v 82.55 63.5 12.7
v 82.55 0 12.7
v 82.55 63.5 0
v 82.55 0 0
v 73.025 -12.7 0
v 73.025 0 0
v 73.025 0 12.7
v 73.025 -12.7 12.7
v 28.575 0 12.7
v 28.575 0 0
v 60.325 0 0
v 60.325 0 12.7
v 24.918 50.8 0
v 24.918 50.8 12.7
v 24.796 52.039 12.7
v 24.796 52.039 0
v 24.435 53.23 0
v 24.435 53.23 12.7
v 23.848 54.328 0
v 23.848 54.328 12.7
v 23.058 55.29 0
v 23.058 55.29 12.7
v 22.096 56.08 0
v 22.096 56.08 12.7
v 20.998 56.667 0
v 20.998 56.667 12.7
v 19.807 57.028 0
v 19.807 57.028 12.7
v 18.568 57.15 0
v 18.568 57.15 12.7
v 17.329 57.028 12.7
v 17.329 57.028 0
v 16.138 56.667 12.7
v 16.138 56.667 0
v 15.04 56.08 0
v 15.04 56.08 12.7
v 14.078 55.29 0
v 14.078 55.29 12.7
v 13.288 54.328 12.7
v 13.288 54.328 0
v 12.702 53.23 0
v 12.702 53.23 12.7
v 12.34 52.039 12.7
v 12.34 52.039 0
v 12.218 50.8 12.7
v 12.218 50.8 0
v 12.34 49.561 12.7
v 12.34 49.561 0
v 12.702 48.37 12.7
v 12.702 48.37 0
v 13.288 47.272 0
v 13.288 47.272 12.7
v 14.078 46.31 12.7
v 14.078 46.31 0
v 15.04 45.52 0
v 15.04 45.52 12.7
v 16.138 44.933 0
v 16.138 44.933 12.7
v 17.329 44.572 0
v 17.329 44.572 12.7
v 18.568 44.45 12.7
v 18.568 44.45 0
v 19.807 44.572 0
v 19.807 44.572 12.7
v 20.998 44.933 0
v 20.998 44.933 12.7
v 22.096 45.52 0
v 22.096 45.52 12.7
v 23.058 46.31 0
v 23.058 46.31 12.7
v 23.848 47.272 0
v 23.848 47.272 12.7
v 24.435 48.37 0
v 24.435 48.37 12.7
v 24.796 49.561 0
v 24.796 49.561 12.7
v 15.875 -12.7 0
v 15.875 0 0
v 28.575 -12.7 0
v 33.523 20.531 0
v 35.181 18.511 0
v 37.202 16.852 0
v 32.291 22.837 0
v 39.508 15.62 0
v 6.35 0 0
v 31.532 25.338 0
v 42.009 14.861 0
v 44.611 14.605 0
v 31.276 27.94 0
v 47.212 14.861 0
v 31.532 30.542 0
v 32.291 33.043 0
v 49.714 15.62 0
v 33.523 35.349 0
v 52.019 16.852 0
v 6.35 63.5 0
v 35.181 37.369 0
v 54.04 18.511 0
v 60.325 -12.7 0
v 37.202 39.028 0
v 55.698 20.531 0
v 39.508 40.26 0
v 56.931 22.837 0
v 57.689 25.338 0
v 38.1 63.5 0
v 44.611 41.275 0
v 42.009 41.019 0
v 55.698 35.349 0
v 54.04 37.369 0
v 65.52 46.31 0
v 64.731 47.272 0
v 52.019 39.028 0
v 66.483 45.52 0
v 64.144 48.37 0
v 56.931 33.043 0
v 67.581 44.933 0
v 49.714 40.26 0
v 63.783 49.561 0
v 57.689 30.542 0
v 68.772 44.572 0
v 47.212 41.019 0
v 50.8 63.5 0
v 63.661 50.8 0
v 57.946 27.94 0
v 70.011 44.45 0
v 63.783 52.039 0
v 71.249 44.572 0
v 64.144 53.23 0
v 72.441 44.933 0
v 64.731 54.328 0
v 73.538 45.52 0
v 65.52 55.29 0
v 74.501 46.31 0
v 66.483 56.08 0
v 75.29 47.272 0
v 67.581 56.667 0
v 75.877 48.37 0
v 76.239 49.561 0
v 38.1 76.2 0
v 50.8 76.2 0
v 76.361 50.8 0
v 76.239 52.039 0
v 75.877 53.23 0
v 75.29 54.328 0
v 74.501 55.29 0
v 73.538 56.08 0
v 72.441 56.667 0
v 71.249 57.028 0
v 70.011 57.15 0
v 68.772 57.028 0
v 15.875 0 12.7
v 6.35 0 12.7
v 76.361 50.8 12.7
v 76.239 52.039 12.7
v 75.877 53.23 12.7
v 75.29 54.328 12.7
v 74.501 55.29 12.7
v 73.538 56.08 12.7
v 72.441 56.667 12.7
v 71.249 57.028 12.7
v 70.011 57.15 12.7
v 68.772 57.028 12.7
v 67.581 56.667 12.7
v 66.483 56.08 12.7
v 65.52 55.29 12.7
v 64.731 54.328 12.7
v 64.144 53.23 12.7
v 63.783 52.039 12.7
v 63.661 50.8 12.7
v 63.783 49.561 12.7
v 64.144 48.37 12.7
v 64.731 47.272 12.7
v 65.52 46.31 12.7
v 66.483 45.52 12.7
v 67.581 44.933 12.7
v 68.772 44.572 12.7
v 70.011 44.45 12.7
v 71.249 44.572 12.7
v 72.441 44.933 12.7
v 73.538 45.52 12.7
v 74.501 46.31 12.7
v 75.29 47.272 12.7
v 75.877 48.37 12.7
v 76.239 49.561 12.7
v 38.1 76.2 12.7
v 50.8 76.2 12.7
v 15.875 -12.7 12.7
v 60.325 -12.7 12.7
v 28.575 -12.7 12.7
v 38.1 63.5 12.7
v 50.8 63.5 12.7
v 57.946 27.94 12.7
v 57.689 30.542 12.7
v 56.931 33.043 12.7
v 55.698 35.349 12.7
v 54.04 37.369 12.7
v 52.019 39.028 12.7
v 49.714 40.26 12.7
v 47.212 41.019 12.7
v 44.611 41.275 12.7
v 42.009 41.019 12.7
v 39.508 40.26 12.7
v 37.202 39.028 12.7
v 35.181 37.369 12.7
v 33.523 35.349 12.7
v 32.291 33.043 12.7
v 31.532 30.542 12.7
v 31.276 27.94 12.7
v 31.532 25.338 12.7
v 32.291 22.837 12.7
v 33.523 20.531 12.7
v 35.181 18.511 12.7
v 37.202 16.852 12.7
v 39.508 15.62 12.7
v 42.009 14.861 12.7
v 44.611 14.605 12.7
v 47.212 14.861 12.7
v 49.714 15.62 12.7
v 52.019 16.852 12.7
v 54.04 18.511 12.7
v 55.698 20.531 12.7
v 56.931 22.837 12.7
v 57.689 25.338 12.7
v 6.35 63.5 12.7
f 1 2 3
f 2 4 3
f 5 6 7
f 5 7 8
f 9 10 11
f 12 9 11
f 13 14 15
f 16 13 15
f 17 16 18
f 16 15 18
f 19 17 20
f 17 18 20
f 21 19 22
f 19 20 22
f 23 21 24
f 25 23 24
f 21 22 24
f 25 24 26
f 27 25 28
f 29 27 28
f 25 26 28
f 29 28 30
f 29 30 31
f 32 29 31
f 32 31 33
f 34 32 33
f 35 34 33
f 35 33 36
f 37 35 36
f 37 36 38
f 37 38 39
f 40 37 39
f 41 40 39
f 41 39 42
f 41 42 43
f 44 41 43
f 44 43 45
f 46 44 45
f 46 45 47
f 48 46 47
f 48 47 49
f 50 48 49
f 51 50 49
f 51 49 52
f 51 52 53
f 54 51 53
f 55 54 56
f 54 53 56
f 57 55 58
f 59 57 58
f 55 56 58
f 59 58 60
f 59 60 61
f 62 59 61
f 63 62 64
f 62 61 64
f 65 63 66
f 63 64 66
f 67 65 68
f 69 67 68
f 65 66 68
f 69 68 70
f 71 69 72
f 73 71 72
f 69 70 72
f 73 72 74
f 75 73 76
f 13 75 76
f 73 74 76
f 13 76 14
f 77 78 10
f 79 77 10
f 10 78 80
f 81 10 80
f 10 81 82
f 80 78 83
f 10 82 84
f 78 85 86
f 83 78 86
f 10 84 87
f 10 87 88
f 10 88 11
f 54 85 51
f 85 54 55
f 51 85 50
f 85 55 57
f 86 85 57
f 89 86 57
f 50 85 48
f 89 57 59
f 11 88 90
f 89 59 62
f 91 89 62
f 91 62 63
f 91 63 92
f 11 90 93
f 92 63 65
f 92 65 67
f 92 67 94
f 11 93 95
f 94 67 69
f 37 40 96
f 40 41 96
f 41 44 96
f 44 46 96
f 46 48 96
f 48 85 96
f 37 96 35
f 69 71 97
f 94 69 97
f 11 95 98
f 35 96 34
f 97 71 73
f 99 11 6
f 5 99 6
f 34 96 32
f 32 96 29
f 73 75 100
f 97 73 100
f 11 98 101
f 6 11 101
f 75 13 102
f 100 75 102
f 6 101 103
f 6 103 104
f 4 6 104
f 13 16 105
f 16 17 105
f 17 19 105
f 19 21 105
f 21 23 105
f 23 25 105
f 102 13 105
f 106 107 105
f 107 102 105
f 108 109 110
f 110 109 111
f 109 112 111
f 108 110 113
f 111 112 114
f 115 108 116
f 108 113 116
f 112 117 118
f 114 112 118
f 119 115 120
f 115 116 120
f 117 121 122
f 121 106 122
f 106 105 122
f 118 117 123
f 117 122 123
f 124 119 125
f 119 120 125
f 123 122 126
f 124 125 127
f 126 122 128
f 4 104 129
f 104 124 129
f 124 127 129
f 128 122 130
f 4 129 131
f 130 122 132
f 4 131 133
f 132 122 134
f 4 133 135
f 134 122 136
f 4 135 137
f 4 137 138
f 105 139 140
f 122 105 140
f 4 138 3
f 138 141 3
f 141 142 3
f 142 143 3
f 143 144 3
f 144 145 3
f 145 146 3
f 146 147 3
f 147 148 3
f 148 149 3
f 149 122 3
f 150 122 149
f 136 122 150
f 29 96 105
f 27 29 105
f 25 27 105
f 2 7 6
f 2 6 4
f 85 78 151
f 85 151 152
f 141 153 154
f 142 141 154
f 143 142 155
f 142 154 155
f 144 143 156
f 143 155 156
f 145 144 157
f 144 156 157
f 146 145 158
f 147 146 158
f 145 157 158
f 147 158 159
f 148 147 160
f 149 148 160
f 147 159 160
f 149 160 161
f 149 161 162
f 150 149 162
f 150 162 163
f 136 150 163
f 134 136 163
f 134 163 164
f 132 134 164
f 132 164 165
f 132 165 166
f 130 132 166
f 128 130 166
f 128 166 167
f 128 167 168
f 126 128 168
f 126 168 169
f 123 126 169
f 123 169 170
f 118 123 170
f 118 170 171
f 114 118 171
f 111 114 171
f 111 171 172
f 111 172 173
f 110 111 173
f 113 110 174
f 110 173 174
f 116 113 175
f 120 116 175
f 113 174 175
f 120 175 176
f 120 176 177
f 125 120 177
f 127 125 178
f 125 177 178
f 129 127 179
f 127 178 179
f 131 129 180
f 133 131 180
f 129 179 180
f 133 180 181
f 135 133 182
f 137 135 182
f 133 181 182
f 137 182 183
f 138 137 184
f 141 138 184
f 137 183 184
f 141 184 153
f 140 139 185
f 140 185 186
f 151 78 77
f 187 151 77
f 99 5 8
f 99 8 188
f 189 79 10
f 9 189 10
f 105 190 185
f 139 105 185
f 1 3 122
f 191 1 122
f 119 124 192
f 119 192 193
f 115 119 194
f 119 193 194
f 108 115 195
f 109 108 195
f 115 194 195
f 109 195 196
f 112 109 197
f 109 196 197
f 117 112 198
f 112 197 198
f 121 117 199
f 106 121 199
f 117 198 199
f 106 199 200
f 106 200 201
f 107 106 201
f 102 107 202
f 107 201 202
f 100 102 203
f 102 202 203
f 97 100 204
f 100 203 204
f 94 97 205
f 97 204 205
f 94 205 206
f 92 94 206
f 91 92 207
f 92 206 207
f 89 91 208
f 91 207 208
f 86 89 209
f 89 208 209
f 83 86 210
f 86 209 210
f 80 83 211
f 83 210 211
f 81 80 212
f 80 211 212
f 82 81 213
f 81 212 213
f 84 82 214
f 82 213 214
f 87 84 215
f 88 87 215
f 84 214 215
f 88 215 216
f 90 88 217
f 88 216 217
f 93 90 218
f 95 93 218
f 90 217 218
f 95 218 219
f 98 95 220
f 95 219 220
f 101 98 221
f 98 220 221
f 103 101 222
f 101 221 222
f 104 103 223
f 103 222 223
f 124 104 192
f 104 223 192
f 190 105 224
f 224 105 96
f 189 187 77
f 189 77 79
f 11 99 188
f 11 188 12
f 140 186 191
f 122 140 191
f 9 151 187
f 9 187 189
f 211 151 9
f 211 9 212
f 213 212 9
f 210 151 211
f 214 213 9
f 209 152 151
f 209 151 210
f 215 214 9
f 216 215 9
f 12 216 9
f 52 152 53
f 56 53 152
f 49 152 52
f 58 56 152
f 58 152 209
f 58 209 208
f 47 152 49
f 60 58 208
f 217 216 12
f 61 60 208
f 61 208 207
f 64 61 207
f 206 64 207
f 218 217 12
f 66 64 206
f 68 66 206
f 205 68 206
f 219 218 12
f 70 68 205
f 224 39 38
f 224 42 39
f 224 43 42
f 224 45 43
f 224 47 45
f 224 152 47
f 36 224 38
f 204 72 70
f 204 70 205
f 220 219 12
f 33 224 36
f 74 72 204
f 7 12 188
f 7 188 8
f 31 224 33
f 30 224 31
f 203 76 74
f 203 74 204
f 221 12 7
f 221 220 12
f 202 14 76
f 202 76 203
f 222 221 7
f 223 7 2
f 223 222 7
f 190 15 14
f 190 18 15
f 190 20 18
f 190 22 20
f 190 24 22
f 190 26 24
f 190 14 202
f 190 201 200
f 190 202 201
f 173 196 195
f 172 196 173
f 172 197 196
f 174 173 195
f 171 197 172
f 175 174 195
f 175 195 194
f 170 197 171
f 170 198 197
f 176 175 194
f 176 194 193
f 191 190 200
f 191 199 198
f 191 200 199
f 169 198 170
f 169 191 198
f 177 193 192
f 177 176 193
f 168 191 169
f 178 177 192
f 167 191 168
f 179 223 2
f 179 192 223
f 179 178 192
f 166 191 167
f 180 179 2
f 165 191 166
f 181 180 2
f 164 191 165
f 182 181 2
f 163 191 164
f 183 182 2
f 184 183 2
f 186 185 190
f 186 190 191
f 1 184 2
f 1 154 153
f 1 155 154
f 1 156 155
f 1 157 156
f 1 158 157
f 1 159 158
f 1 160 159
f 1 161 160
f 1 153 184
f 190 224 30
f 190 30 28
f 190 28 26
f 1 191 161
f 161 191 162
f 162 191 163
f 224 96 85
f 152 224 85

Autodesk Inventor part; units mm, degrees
ref_plane "YZ Plane" through (0, 0, 0) normal (1, 0, 0) x (0, 1, 0)
ref_plane "XZ Plane" through (0, 0, 0) normal (0, 1, 0) x (-1, 0, 0)
ref_plane "XY Plane" through (0, 0, 0) normal (0, 0, 1) x (1, 0, 0)
sketch "Sketch1" plane through (0, 0, 0) normal (0, 0, 1) x (1, 0, 0)
  circle A0 centre (44.45, 27.9405) radius 6.985 construction
  circle A1 centre (18.5683, 50.8) radius 6.35 construction
  line L0 (6.35, 63.5) -> (6.35, 50.8) construction
  line L1 (6.35, 50.8) -> (19.05, 50.8) construction
  line L2 (19.05, 50.8) -> (19.05, 63.5) construction
  line L3 (19.05, 63.5) -> (6.35, 63.5) construction
  circle A2 centre (70.0106, 50.8) radius 6.35 construction
  line L4 (31.779, 27.94) -> (38.1948, 39.0525) construction
  line L5 (38.1948, 39.0525) -> (51.0264, 39.0525) construction
  line L6 (51.0264, 39.0525) -> (57.4422, 27.94) construction
  line L7 (57.4422, 27.94) -> (51.0264, 16.8275) construction
  line L8 (51.0264, 16.8275) -> (38.1948, 16.8275) construction
  line L9 (6.35, 63.5) -> (6.35, 0)
  line L10 (82.55, 0) -> (82.55, 63.5)
  line L11 (82.55, 63.5) -> (6.35, 63.5)
  line L12 (31.779, 27.94) -> (38.1948, 16.8275) construction
  line L13 (44.45, 0) -> (44.45, 27.9405) construction
  line L14 (44.45, 27.9405) -> (44.45, 63.5) construction
  line L15 (44.45, 0) -> (60.325, 0)
  line L16 (44.45, 0) -> (60.325, 0)
  line L17 (73.025, 0) -> (73.025, -12.7)
  line L18 (73.025, -12.7) -> (60.325, -12.7)
  line L19 (60.325, -12.7) -> (60.325, 0)
  line L20 (73.025, 0) -> (82.55, 0)
  line L21 (44.45, 0) -> (28.575, 0)
  line L22 (44.45, 0) -> (28.575, 0)
  line L23 (15.875, 0) -> (15.875, -12.7)
  line L24 (15.875, -12.7) -> (28.575, -12.7)
  line L25 (28.575, -12.7) -> (28.575, 0)
  line L26 (15.875, 0) -> (6.35, 0)
  point P0 (0, 0)
  point P1 (0, 0)
  point P2 (12.8606, 0)
  dimension "d0" = 76.2
  dimension "d1" = 63.5
  dimension "d21" = 15.875
  dimension "d22" = 0
  dimension "d24" = 12.7
  dimension "d25" = 12.7
extrude "Extrusion1" add sketch "Sketch1" along normal blind 12.7
sketch "Sketch2" plane through (0, 0, 12.7) normal (0, 0, 1) x (1, 0, 0)
  circle A0 centre (18.5683, 50.8) radius 6.35
  line L0 (31.779, 27.94) -> (38.1948, 39.0525) construction
  line L1 (44.45, 0) -> (44.45, 15.875) construction
  line L2 (38.1948, 39.0525) -> (51.0264, 39.0525) construction
  line L3 (51.0264, 16.8275) -> (38.1948, 16.8275) construction
  circle A1 centre (44.6106, 27.94) radius 13.335
  line L4 (51.0264, 39.0525) -> (57.4422, 27.94) construction
  line L5 (57.4422, 27.94) -> (51.0264, 16.8275) construction
  circle A2 centre (70.0106, 50.8) radius 6.35
  line L6 (44.45, 0) -> (44.45, 27.94) construction
  line L7 (31.779, 27.94) -> (38.1948, 16.8275) construction
  line L8 (44.45, 0) -> (44.45, 27.94) construction
  line L9 (6.35, 63.5) -> (82.55, 63.5) construction
  line L10 (44.45, 27.94) -> (44.45, 63.5) construction
  line L11 (82.55, 63.5) -> (6.35, 63.5) construction
  dimension "d8" = 26.67
  dimension "d9" = 12.7
  dimension "d10" = 12.7
  dimension "d17" = 27.94
extrude "Extrusion2" cut sketch "Sketch2" against normal blind 12.7
sketch "Sketch3" plane through (0, 0, 12.7) normal (0, 0, 1) x (1, 0, 0)
  line L0 (28.575, 0) -> (60.325, 0) construction
  line L1 (44.45, 0) -> (44.45, 63.5) construction
  line L2 (82.55, 63.5) -> (6.35, 63.5) construction
  line L3 (44.45, 63.5) -> (44.45, 69.85) construction
  line L4 (38.1, 76.2) -> (50.8, 76.2)
  line L5 (50.8, 76.2) -> (50.8, 63.5)
  line L6 (50.8, 63.5) -> (38.1, 63.5)
  line L7 (38.1, 63.5) -> (38.1, 76.2)
  line L8 (38.1, 76.2) -> (50.8, 63.5) construction
  line L9 (50.8, 76.2) -> (38.1, 63.5) construction
  point P0 (0, 0)
  dimension "d26" = 6.35
  dimension "d27" = 12.7
  dimension "d28" = 12.7
extrude "Extrusion3" add sketch "Sketch3" against normal blind 12.7
properties part number "Near Holder" material "PVC-Piping"
